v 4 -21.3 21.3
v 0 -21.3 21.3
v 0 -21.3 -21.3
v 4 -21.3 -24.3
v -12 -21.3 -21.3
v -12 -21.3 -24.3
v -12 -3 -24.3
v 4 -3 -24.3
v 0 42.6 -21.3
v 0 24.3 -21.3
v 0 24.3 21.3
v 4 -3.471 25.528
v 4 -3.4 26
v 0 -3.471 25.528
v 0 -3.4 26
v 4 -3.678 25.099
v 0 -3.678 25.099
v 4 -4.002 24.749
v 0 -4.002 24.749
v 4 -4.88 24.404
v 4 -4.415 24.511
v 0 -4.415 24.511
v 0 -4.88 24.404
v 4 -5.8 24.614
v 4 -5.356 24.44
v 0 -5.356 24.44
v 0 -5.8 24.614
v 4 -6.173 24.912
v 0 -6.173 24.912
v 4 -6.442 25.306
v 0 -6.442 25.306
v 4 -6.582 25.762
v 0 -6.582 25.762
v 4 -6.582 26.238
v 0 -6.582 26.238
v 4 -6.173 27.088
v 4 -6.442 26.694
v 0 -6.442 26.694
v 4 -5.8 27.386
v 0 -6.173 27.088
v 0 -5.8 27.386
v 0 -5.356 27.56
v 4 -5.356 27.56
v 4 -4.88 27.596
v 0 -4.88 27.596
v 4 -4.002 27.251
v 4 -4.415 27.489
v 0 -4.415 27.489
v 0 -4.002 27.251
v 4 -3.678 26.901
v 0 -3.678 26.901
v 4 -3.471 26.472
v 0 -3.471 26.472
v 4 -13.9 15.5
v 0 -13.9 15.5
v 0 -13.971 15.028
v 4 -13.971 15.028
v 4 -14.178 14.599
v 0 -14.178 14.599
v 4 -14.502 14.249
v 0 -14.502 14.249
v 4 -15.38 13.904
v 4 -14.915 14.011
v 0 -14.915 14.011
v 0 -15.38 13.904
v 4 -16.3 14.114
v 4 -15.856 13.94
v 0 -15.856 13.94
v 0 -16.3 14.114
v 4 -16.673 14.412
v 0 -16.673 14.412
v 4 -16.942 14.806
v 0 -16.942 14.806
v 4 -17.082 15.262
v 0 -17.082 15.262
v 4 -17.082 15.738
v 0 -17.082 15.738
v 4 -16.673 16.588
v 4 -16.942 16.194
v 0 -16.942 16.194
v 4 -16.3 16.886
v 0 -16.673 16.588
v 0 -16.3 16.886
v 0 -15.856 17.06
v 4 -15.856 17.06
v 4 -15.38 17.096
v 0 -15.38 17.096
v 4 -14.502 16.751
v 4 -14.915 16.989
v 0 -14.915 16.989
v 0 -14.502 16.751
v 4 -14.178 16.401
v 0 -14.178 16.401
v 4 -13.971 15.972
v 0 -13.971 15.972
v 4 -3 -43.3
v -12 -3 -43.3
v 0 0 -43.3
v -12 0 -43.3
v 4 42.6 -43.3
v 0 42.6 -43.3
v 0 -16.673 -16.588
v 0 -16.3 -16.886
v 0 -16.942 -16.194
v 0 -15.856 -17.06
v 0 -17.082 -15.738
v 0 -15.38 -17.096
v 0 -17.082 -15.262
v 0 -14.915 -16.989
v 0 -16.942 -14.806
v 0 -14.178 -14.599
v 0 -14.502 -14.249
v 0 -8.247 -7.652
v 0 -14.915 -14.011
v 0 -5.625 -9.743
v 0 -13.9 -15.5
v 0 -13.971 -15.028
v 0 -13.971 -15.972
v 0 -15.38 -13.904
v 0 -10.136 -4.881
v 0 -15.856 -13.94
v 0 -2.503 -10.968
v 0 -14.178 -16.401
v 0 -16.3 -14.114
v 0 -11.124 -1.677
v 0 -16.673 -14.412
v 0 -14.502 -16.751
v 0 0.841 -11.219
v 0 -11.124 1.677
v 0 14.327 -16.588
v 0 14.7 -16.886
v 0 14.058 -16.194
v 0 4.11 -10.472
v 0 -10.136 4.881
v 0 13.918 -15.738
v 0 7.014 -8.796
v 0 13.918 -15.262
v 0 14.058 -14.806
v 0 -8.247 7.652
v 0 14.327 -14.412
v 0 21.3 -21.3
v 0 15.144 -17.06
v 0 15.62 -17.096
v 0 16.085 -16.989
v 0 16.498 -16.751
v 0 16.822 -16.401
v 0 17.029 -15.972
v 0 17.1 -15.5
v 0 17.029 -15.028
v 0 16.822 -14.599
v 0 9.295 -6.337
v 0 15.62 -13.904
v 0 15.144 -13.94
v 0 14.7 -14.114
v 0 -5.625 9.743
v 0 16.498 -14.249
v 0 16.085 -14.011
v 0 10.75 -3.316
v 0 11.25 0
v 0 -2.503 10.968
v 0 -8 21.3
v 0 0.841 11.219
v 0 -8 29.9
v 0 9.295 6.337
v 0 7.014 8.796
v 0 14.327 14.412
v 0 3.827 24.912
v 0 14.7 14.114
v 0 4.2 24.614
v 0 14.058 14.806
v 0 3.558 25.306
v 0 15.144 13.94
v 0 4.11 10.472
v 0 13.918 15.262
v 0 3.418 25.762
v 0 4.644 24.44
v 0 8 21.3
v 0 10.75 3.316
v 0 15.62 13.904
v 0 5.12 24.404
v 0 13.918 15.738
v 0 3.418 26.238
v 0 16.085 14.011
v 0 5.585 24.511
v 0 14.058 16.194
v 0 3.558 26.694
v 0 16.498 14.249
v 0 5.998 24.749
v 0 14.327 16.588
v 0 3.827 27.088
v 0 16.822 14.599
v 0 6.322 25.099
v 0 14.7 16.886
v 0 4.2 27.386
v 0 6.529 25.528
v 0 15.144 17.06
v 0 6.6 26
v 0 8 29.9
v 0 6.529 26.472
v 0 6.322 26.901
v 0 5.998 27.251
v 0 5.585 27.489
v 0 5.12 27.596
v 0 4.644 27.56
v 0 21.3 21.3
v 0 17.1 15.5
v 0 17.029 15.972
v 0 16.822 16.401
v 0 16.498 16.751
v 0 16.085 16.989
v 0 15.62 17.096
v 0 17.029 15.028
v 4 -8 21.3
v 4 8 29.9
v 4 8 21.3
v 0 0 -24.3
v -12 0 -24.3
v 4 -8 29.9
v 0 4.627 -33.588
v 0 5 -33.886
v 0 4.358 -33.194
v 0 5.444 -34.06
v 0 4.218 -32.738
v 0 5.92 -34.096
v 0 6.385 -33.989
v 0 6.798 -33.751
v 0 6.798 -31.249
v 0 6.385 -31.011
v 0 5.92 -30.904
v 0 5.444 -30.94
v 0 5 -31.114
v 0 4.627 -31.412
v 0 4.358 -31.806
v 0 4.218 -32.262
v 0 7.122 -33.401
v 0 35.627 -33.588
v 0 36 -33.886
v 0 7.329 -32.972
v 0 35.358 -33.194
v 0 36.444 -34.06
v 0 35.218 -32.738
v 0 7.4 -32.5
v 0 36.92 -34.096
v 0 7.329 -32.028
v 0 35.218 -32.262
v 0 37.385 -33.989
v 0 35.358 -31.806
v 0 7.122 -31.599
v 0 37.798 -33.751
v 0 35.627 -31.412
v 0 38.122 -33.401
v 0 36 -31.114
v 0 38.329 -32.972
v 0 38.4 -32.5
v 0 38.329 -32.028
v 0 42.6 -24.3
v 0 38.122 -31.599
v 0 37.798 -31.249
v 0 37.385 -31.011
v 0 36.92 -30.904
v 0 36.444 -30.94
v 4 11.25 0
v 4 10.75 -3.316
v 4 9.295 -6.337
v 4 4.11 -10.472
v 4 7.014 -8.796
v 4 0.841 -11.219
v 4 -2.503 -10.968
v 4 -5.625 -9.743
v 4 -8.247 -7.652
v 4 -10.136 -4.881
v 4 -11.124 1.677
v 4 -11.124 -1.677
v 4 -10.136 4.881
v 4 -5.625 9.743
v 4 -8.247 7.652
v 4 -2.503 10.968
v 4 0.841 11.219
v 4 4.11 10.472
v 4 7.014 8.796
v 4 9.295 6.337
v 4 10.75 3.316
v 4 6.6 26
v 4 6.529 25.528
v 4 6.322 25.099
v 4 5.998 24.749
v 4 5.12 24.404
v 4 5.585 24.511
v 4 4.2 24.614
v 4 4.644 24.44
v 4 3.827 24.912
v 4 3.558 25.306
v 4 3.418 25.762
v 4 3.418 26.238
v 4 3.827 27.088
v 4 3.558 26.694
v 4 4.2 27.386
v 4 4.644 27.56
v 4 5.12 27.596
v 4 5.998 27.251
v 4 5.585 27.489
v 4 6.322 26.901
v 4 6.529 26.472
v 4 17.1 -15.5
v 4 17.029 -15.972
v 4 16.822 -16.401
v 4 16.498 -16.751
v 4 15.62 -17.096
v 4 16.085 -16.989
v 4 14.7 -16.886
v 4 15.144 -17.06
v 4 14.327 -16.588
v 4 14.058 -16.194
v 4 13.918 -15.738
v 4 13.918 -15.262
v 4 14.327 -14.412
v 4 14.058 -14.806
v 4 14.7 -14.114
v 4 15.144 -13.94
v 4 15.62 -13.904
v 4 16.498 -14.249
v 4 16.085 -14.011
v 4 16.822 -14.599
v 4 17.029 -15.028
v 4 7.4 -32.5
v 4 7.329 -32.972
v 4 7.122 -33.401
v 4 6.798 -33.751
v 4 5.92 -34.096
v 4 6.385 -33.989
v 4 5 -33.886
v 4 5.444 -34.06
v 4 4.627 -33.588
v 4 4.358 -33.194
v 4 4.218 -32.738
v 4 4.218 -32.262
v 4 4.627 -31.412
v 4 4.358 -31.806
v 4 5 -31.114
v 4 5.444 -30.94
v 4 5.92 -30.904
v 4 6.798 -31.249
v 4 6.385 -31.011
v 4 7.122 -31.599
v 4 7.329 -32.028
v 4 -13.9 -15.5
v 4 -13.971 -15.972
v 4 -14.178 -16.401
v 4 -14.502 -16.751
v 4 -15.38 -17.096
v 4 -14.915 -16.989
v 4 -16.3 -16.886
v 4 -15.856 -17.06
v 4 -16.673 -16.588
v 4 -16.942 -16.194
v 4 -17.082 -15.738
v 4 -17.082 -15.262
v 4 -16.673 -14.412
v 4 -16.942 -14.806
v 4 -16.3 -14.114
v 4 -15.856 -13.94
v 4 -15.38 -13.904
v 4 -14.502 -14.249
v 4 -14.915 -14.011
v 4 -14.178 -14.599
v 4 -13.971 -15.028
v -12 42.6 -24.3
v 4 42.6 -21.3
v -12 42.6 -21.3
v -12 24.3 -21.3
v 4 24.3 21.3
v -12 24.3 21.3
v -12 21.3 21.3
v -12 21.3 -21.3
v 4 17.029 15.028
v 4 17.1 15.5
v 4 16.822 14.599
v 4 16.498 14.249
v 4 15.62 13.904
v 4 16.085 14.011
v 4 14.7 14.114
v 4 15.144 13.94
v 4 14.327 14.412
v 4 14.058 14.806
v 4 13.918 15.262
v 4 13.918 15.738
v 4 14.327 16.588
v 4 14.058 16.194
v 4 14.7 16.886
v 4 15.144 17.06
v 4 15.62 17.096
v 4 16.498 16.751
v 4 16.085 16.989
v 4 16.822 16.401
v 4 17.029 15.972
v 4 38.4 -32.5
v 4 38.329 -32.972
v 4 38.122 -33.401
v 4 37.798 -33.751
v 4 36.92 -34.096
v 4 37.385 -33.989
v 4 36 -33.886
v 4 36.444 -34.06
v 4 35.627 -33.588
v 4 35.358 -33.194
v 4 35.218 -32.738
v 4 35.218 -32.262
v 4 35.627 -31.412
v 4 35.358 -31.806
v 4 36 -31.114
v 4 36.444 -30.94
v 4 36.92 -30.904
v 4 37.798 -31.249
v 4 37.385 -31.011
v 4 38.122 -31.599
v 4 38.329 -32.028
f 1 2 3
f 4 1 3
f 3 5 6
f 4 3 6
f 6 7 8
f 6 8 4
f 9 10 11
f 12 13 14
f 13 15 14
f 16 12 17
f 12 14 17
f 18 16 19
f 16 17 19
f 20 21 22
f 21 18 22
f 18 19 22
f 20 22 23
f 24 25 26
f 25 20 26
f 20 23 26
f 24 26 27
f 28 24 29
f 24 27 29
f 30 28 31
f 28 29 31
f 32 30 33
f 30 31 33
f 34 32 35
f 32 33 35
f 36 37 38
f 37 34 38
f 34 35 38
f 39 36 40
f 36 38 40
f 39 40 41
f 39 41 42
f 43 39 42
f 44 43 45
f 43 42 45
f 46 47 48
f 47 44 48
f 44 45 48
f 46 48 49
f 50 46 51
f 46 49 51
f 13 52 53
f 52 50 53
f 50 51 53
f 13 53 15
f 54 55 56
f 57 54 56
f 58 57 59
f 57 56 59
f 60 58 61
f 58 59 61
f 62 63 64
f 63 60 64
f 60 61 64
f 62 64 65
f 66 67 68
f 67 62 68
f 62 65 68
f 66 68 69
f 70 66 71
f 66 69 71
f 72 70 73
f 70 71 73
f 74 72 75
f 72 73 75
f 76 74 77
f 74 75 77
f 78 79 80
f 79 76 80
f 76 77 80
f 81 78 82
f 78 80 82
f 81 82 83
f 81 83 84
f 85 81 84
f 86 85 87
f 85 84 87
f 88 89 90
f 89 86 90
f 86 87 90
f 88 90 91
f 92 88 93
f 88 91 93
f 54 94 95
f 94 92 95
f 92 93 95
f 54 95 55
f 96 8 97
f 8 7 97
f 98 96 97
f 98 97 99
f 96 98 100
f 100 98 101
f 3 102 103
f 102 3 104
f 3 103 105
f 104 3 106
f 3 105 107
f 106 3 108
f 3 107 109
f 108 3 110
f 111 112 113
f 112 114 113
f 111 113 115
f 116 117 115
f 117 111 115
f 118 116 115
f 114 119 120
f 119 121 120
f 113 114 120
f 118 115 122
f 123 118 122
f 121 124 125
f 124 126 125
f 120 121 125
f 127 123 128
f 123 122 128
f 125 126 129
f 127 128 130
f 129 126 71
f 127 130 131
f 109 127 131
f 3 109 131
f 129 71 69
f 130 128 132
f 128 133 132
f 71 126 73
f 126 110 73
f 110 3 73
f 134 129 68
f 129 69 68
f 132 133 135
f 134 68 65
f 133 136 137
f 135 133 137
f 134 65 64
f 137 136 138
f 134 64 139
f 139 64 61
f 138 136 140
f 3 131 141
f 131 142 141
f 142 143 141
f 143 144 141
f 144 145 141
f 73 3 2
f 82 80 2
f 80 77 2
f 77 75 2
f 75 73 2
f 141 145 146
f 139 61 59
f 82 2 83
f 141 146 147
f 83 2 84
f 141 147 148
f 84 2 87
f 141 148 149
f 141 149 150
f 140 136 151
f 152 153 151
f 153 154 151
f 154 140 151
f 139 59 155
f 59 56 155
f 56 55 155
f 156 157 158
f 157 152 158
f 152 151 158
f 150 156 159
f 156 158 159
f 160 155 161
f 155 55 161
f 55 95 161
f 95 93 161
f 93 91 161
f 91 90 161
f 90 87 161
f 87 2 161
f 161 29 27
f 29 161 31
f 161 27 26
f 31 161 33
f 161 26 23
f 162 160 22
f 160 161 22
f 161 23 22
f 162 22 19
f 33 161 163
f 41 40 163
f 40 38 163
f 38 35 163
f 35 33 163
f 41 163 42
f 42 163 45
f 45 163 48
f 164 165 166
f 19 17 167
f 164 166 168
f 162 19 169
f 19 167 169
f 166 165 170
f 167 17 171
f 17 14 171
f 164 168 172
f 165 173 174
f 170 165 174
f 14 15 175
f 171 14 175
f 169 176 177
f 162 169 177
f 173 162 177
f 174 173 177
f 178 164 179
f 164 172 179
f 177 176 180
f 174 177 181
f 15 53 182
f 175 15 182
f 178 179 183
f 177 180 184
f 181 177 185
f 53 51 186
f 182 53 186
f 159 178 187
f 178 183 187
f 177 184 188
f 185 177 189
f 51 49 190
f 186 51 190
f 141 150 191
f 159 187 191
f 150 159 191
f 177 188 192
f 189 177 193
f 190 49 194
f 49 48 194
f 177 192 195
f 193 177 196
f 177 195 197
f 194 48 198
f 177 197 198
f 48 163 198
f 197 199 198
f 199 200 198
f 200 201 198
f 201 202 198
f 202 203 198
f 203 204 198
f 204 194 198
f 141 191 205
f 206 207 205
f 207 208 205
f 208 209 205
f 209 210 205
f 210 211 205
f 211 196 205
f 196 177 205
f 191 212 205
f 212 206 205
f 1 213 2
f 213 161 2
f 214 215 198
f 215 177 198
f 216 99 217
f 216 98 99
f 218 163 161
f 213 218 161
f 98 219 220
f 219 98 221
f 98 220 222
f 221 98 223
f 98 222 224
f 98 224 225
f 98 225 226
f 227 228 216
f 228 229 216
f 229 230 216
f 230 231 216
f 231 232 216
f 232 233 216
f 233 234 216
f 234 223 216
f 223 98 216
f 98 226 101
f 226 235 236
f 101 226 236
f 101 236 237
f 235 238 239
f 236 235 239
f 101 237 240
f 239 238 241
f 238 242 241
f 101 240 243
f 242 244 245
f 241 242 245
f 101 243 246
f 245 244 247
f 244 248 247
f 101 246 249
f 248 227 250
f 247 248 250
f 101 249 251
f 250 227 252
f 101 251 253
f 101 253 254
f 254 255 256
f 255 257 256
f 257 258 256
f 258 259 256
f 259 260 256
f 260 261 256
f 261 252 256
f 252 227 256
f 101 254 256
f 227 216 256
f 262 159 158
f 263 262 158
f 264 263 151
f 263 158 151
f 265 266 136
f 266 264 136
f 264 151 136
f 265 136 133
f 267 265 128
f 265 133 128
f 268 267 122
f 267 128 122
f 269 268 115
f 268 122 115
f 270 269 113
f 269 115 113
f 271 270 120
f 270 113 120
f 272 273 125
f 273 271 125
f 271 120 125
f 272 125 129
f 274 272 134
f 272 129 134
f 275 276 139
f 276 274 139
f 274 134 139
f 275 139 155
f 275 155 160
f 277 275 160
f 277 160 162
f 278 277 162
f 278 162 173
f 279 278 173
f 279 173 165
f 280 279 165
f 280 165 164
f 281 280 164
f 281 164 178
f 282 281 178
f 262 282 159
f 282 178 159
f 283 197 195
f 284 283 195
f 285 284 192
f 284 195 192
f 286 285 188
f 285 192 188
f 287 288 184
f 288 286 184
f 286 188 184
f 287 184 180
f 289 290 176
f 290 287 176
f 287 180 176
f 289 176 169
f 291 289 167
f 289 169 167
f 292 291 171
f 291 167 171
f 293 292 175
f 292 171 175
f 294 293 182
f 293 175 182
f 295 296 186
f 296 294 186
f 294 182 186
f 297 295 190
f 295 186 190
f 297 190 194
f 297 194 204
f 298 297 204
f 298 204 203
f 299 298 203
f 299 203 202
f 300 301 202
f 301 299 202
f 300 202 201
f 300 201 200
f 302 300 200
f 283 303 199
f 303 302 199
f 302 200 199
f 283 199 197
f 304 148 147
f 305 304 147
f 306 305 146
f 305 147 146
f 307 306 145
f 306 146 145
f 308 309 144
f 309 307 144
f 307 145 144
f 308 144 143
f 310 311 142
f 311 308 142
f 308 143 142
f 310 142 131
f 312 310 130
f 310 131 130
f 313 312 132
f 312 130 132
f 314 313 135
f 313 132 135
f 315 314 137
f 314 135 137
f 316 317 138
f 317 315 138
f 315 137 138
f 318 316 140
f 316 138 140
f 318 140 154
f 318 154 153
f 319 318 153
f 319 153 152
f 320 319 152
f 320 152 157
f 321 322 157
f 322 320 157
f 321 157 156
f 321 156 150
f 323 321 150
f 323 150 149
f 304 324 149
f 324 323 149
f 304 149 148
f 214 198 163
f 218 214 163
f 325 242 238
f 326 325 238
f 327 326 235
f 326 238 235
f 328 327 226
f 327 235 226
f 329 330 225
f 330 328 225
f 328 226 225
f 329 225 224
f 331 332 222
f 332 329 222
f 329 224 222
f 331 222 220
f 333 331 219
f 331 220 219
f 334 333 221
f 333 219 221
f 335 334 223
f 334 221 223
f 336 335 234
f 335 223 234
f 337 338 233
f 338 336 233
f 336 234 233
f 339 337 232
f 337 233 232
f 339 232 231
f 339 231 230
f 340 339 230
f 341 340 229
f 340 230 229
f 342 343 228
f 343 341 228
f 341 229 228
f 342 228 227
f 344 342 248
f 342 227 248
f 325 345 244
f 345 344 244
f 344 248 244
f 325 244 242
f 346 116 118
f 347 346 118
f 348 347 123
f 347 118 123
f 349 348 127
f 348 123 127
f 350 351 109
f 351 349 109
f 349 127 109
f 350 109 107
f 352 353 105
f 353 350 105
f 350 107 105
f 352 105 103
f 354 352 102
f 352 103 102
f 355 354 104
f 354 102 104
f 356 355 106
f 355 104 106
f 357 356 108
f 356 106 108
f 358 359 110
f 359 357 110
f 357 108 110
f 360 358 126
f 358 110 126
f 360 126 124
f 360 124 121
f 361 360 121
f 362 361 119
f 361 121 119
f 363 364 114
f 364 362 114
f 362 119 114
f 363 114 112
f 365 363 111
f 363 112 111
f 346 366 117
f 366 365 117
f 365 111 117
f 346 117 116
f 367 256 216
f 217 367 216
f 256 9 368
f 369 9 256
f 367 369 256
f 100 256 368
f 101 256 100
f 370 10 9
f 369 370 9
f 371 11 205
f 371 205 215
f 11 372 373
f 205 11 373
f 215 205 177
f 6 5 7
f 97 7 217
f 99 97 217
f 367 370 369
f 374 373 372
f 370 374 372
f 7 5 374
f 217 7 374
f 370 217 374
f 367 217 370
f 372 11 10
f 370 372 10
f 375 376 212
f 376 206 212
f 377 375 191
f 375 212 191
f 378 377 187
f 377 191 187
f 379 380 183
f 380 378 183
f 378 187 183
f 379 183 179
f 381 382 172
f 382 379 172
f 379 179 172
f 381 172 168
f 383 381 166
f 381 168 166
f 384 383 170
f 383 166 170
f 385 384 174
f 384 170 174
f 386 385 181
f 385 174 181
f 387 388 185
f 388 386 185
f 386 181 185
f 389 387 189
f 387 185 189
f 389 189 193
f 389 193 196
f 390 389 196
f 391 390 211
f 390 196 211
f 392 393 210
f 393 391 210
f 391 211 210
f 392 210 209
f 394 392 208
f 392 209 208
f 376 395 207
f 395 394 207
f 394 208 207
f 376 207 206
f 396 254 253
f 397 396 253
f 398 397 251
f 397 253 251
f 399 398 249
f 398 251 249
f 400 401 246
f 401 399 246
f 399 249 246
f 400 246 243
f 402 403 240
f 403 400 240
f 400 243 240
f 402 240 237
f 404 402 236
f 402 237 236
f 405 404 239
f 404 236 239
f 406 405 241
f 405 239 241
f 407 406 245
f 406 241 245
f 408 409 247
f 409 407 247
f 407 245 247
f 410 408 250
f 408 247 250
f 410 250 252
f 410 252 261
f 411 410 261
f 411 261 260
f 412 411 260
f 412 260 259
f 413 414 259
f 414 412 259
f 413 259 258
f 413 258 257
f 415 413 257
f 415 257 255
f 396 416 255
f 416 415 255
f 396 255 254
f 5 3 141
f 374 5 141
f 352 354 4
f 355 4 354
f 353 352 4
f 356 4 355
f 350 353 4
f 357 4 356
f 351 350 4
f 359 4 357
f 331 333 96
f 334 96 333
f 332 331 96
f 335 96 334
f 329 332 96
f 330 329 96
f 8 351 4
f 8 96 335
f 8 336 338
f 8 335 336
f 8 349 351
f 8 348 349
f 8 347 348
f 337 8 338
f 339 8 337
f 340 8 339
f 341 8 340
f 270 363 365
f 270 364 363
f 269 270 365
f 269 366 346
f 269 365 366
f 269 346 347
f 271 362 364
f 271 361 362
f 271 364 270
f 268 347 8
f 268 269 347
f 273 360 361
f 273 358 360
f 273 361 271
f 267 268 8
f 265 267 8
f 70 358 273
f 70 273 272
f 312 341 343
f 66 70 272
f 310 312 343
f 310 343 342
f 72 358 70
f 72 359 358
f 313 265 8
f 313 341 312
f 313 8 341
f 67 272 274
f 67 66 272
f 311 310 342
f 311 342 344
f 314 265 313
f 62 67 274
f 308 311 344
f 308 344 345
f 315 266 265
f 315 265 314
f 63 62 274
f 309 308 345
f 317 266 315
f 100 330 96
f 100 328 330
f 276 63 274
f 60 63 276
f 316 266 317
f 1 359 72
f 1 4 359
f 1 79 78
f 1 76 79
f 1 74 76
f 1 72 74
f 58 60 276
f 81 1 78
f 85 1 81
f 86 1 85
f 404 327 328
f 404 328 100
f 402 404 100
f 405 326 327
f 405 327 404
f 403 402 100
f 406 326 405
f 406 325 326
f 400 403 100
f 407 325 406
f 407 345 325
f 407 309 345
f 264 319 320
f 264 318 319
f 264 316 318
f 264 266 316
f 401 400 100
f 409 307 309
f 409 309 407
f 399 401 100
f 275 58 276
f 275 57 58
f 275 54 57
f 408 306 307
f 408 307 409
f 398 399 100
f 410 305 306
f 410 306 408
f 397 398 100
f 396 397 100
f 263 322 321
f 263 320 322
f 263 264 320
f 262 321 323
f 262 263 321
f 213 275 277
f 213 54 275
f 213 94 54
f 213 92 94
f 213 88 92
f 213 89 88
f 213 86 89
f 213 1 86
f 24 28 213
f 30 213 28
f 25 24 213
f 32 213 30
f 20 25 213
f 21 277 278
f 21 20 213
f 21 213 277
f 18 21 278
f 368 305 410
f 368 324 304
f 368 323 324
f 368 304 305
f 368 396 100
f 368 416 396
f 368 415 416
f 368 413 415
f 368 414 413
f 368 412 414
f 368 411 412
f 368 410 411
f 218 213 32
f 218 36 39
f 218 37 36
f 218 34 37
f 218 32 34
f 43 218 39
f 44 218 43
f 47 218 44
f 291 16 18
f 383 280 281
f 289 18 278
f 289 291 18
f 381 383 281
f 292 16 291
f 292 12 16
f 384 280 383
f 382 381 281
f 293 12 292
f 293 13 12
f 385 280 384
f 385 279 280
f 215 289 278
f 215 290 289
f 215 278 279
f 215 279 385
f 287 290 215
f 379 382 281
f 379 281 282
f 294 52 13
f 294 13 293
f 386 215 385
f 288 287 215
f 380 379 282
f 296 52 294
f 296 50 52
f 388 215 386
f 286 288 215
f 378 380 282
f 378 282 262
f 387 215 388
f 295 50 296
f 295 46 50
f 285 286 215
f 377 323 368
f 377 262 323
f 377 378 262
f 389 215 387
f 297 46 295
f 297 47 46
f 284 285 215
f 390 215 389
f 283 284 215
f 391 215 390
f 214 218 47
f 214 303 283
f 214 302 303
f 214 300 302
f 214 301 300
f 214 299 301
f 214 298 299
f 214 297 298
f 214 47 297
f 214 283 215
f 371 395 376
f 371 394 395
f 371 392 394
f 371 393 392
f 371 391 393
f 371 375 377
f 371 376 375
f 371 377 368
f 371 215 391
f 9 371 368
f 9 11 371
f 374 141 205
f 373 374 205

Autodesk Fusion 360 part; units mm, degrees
sketch "motor_mount" plane through (0, 0, 0) normal (1, 0, 0) x (0, 1, 0)
  circle A0 centre (0, 0) radius 11.25
  line L0 (15.5, 15.5) -> (-15.5, 15.5) construction
  line L1 (-15.5, 15.5) -> (-15.5, -15.5) construction
  line L2 (-15.5, -15.5) -> (15.5, -15.5) construction
  line L3 (15.5, -15.5) -> (15.5, 15.5) construction
  line L4 (15.5, 15.5) -> (-15.5, -15.5) construction
  line L5 (-15.5, 15.5) -> (15.5, -15.5) construction
  line L6 (21.3, 21.3) -> (-21.3, 21.3)
  line L7 (-21.3, 21.3) -> (-21.3, -21.3)
  line L8 (-21.3, -21.3) -> (21.3, -21.3)
  line L9 (21.3, -21.3) -> (21.3, 21.3)
  line L10 (21.3, 21.3) -> (-21.3, -21.3) construction
  line L11 (-21.3, 21.3) -> (21.3, -21.3) construction
  line L12 (-21.3, -21.3) -> (21.3, -21.3)
  line L13 (-21.3, -21.3) -> (21.3, -21.3)
  line L14 (21.3, -24.3) -> (-21.3, -24.3)
  line L15 (-21.3, -24.3) -> (-21.3, -21.3)
  circle A1 centre (-15.5, 15.5) radius 1.6
  circle A2 centre (15.5, 15.5) radius 1.6
  circle A3 centre (-15.5, -15.5) radius 1.6
  circle A4 centre (15.5, -15.5) radius 1.6
  circle A5 centre (36.8, -32.5) radius 1.6
  circle A6 centre (5.8, -32.5) radius 1.6
  line L16 (5.8, -32.5) -> (36.8, -32.5) construction
  line L17 (0, -24.3) -> (-3, -24.3)
  line L18 (-3, -24.3) -> (-3, -43.3)
  line L19 (-3, -43.3) -> (0, -43.3)
  line L20 (0, -43.3) -> (0, -24.3)
  line L21 (0, -43.3) -> (42.6, -43.3)
  line L22 (42.6, -43.3) -> (42.6, -24.3)
  line L23 (42.6, -24.3) -> (21.3, -24.3)
  line L24 (21.3, -21.3) -> (42.6, -21.3)
  line L25 (42.6, -21.3) -> (42.6, -24.3)
  line L26 (21.3, 21.3) -> (24.3, 21.3)
  line L27 (24.3, 21.3) -> (24.3, -21.3)
  line L28 (24.3, -21.3) -> (21.3, -21.3)
  line L29 (21.3, -21.3) -> (21.3, 21.3)
  line L30 (24.3, 21.3) -> (42.6, -21.3)
  line L31 (0, 21.3) -> (-8, 21.3)
  line L32 (-8, 21.3) -> (8, 21.3)
  line L33 (8, 21.3) -> (8, 29.9)
  line L34 (8, 29.9) -> (-8, 29.9)
  line L35 (-8, 29.9) -> (-8, 21.3)
  circle A7 centre (-5, 26) radius 1.6
  circle A8 centre (5, 26) radius 1.6
  dimension "d1" = 22.5
  dimension "d2" = 31
  dimension "d3" = 31
  dimension "d5" = 42.6
  dimension "d6" = 42.6
  dimension "d8" = 3
  dimension "d9" = 3.2
  dimension "d10" = 3.2
  dimension "d11" = 3.2
  dimension "d12" = 3.2
  dimension "d13" = 3.2
  dimension "d14" = 3.2
  dimension "d267" = 31
  dimension "d268" = 3
  dimension "d269" = 19
  dimension "d270" = 42.6
  dimension "d271" = 3
  dimension "d286" = 8
  dimension "d287" = 16
  dimension "d288" = 8.6
  dimension "d323" = 3.2
  dimension "d324" = 3.2
extrude "Extrude1" add sketch "motor_mount" along normal blind 4 makes body 1
extrude "Extrude2" add sketch "motor_mount" against normal blind 12 contours L9 L24 L26 L27 L28 L29 | L8 L12 L13 L14 L15 L17 L23 L24 L25 L28 | L14 L17 L18 L19 L20 bodies 1
mirror "Mirror1" about plane through (0, 0, 0) normal (0, 1, 0) of bodies 1 makes body 2
hidden bodies 2
equation "pen_min_diam = 8 mm"
equation "pen_max_diam = 13 mm"
equation "pen_holder_diam = 17 mm"
equation "pen_shaft_diam = 23 mm"
equation "pen_sled_diam = 50 mm"
equation "pen_bearing_tolerance = 0.7 mm"
equation "pen_support_diam = 36 mm"
equation "pen_shaft_tolerance = 0.8 mm"
equation "sled_thickness = 4 mm"
equation "bearing_offset_ring_thickness = 0.5 mm"
equation "assembly_tolerance = 0.2 mm"
equation "bearing_1_plane = sled_thickness + bearing_offset_ring_thickness + assembly_tolerance"
equation "bearing_thickness = 3.6 mm"
equation "bearing_2_plane = bearing_1_plane + bearing_thickness + assembly_tolerance"
equation "bearing_cap_plane = bearing_2_plane + bearing_thickness + bearing_offset_ring_thickness + assembly_tolerance"
equation "bearing_cap_threaded_thickness = 4 mm"
equation "bearing_cap_supported_thickness = 4 mm"
equation "bearing_cap_height = 20 mm"
